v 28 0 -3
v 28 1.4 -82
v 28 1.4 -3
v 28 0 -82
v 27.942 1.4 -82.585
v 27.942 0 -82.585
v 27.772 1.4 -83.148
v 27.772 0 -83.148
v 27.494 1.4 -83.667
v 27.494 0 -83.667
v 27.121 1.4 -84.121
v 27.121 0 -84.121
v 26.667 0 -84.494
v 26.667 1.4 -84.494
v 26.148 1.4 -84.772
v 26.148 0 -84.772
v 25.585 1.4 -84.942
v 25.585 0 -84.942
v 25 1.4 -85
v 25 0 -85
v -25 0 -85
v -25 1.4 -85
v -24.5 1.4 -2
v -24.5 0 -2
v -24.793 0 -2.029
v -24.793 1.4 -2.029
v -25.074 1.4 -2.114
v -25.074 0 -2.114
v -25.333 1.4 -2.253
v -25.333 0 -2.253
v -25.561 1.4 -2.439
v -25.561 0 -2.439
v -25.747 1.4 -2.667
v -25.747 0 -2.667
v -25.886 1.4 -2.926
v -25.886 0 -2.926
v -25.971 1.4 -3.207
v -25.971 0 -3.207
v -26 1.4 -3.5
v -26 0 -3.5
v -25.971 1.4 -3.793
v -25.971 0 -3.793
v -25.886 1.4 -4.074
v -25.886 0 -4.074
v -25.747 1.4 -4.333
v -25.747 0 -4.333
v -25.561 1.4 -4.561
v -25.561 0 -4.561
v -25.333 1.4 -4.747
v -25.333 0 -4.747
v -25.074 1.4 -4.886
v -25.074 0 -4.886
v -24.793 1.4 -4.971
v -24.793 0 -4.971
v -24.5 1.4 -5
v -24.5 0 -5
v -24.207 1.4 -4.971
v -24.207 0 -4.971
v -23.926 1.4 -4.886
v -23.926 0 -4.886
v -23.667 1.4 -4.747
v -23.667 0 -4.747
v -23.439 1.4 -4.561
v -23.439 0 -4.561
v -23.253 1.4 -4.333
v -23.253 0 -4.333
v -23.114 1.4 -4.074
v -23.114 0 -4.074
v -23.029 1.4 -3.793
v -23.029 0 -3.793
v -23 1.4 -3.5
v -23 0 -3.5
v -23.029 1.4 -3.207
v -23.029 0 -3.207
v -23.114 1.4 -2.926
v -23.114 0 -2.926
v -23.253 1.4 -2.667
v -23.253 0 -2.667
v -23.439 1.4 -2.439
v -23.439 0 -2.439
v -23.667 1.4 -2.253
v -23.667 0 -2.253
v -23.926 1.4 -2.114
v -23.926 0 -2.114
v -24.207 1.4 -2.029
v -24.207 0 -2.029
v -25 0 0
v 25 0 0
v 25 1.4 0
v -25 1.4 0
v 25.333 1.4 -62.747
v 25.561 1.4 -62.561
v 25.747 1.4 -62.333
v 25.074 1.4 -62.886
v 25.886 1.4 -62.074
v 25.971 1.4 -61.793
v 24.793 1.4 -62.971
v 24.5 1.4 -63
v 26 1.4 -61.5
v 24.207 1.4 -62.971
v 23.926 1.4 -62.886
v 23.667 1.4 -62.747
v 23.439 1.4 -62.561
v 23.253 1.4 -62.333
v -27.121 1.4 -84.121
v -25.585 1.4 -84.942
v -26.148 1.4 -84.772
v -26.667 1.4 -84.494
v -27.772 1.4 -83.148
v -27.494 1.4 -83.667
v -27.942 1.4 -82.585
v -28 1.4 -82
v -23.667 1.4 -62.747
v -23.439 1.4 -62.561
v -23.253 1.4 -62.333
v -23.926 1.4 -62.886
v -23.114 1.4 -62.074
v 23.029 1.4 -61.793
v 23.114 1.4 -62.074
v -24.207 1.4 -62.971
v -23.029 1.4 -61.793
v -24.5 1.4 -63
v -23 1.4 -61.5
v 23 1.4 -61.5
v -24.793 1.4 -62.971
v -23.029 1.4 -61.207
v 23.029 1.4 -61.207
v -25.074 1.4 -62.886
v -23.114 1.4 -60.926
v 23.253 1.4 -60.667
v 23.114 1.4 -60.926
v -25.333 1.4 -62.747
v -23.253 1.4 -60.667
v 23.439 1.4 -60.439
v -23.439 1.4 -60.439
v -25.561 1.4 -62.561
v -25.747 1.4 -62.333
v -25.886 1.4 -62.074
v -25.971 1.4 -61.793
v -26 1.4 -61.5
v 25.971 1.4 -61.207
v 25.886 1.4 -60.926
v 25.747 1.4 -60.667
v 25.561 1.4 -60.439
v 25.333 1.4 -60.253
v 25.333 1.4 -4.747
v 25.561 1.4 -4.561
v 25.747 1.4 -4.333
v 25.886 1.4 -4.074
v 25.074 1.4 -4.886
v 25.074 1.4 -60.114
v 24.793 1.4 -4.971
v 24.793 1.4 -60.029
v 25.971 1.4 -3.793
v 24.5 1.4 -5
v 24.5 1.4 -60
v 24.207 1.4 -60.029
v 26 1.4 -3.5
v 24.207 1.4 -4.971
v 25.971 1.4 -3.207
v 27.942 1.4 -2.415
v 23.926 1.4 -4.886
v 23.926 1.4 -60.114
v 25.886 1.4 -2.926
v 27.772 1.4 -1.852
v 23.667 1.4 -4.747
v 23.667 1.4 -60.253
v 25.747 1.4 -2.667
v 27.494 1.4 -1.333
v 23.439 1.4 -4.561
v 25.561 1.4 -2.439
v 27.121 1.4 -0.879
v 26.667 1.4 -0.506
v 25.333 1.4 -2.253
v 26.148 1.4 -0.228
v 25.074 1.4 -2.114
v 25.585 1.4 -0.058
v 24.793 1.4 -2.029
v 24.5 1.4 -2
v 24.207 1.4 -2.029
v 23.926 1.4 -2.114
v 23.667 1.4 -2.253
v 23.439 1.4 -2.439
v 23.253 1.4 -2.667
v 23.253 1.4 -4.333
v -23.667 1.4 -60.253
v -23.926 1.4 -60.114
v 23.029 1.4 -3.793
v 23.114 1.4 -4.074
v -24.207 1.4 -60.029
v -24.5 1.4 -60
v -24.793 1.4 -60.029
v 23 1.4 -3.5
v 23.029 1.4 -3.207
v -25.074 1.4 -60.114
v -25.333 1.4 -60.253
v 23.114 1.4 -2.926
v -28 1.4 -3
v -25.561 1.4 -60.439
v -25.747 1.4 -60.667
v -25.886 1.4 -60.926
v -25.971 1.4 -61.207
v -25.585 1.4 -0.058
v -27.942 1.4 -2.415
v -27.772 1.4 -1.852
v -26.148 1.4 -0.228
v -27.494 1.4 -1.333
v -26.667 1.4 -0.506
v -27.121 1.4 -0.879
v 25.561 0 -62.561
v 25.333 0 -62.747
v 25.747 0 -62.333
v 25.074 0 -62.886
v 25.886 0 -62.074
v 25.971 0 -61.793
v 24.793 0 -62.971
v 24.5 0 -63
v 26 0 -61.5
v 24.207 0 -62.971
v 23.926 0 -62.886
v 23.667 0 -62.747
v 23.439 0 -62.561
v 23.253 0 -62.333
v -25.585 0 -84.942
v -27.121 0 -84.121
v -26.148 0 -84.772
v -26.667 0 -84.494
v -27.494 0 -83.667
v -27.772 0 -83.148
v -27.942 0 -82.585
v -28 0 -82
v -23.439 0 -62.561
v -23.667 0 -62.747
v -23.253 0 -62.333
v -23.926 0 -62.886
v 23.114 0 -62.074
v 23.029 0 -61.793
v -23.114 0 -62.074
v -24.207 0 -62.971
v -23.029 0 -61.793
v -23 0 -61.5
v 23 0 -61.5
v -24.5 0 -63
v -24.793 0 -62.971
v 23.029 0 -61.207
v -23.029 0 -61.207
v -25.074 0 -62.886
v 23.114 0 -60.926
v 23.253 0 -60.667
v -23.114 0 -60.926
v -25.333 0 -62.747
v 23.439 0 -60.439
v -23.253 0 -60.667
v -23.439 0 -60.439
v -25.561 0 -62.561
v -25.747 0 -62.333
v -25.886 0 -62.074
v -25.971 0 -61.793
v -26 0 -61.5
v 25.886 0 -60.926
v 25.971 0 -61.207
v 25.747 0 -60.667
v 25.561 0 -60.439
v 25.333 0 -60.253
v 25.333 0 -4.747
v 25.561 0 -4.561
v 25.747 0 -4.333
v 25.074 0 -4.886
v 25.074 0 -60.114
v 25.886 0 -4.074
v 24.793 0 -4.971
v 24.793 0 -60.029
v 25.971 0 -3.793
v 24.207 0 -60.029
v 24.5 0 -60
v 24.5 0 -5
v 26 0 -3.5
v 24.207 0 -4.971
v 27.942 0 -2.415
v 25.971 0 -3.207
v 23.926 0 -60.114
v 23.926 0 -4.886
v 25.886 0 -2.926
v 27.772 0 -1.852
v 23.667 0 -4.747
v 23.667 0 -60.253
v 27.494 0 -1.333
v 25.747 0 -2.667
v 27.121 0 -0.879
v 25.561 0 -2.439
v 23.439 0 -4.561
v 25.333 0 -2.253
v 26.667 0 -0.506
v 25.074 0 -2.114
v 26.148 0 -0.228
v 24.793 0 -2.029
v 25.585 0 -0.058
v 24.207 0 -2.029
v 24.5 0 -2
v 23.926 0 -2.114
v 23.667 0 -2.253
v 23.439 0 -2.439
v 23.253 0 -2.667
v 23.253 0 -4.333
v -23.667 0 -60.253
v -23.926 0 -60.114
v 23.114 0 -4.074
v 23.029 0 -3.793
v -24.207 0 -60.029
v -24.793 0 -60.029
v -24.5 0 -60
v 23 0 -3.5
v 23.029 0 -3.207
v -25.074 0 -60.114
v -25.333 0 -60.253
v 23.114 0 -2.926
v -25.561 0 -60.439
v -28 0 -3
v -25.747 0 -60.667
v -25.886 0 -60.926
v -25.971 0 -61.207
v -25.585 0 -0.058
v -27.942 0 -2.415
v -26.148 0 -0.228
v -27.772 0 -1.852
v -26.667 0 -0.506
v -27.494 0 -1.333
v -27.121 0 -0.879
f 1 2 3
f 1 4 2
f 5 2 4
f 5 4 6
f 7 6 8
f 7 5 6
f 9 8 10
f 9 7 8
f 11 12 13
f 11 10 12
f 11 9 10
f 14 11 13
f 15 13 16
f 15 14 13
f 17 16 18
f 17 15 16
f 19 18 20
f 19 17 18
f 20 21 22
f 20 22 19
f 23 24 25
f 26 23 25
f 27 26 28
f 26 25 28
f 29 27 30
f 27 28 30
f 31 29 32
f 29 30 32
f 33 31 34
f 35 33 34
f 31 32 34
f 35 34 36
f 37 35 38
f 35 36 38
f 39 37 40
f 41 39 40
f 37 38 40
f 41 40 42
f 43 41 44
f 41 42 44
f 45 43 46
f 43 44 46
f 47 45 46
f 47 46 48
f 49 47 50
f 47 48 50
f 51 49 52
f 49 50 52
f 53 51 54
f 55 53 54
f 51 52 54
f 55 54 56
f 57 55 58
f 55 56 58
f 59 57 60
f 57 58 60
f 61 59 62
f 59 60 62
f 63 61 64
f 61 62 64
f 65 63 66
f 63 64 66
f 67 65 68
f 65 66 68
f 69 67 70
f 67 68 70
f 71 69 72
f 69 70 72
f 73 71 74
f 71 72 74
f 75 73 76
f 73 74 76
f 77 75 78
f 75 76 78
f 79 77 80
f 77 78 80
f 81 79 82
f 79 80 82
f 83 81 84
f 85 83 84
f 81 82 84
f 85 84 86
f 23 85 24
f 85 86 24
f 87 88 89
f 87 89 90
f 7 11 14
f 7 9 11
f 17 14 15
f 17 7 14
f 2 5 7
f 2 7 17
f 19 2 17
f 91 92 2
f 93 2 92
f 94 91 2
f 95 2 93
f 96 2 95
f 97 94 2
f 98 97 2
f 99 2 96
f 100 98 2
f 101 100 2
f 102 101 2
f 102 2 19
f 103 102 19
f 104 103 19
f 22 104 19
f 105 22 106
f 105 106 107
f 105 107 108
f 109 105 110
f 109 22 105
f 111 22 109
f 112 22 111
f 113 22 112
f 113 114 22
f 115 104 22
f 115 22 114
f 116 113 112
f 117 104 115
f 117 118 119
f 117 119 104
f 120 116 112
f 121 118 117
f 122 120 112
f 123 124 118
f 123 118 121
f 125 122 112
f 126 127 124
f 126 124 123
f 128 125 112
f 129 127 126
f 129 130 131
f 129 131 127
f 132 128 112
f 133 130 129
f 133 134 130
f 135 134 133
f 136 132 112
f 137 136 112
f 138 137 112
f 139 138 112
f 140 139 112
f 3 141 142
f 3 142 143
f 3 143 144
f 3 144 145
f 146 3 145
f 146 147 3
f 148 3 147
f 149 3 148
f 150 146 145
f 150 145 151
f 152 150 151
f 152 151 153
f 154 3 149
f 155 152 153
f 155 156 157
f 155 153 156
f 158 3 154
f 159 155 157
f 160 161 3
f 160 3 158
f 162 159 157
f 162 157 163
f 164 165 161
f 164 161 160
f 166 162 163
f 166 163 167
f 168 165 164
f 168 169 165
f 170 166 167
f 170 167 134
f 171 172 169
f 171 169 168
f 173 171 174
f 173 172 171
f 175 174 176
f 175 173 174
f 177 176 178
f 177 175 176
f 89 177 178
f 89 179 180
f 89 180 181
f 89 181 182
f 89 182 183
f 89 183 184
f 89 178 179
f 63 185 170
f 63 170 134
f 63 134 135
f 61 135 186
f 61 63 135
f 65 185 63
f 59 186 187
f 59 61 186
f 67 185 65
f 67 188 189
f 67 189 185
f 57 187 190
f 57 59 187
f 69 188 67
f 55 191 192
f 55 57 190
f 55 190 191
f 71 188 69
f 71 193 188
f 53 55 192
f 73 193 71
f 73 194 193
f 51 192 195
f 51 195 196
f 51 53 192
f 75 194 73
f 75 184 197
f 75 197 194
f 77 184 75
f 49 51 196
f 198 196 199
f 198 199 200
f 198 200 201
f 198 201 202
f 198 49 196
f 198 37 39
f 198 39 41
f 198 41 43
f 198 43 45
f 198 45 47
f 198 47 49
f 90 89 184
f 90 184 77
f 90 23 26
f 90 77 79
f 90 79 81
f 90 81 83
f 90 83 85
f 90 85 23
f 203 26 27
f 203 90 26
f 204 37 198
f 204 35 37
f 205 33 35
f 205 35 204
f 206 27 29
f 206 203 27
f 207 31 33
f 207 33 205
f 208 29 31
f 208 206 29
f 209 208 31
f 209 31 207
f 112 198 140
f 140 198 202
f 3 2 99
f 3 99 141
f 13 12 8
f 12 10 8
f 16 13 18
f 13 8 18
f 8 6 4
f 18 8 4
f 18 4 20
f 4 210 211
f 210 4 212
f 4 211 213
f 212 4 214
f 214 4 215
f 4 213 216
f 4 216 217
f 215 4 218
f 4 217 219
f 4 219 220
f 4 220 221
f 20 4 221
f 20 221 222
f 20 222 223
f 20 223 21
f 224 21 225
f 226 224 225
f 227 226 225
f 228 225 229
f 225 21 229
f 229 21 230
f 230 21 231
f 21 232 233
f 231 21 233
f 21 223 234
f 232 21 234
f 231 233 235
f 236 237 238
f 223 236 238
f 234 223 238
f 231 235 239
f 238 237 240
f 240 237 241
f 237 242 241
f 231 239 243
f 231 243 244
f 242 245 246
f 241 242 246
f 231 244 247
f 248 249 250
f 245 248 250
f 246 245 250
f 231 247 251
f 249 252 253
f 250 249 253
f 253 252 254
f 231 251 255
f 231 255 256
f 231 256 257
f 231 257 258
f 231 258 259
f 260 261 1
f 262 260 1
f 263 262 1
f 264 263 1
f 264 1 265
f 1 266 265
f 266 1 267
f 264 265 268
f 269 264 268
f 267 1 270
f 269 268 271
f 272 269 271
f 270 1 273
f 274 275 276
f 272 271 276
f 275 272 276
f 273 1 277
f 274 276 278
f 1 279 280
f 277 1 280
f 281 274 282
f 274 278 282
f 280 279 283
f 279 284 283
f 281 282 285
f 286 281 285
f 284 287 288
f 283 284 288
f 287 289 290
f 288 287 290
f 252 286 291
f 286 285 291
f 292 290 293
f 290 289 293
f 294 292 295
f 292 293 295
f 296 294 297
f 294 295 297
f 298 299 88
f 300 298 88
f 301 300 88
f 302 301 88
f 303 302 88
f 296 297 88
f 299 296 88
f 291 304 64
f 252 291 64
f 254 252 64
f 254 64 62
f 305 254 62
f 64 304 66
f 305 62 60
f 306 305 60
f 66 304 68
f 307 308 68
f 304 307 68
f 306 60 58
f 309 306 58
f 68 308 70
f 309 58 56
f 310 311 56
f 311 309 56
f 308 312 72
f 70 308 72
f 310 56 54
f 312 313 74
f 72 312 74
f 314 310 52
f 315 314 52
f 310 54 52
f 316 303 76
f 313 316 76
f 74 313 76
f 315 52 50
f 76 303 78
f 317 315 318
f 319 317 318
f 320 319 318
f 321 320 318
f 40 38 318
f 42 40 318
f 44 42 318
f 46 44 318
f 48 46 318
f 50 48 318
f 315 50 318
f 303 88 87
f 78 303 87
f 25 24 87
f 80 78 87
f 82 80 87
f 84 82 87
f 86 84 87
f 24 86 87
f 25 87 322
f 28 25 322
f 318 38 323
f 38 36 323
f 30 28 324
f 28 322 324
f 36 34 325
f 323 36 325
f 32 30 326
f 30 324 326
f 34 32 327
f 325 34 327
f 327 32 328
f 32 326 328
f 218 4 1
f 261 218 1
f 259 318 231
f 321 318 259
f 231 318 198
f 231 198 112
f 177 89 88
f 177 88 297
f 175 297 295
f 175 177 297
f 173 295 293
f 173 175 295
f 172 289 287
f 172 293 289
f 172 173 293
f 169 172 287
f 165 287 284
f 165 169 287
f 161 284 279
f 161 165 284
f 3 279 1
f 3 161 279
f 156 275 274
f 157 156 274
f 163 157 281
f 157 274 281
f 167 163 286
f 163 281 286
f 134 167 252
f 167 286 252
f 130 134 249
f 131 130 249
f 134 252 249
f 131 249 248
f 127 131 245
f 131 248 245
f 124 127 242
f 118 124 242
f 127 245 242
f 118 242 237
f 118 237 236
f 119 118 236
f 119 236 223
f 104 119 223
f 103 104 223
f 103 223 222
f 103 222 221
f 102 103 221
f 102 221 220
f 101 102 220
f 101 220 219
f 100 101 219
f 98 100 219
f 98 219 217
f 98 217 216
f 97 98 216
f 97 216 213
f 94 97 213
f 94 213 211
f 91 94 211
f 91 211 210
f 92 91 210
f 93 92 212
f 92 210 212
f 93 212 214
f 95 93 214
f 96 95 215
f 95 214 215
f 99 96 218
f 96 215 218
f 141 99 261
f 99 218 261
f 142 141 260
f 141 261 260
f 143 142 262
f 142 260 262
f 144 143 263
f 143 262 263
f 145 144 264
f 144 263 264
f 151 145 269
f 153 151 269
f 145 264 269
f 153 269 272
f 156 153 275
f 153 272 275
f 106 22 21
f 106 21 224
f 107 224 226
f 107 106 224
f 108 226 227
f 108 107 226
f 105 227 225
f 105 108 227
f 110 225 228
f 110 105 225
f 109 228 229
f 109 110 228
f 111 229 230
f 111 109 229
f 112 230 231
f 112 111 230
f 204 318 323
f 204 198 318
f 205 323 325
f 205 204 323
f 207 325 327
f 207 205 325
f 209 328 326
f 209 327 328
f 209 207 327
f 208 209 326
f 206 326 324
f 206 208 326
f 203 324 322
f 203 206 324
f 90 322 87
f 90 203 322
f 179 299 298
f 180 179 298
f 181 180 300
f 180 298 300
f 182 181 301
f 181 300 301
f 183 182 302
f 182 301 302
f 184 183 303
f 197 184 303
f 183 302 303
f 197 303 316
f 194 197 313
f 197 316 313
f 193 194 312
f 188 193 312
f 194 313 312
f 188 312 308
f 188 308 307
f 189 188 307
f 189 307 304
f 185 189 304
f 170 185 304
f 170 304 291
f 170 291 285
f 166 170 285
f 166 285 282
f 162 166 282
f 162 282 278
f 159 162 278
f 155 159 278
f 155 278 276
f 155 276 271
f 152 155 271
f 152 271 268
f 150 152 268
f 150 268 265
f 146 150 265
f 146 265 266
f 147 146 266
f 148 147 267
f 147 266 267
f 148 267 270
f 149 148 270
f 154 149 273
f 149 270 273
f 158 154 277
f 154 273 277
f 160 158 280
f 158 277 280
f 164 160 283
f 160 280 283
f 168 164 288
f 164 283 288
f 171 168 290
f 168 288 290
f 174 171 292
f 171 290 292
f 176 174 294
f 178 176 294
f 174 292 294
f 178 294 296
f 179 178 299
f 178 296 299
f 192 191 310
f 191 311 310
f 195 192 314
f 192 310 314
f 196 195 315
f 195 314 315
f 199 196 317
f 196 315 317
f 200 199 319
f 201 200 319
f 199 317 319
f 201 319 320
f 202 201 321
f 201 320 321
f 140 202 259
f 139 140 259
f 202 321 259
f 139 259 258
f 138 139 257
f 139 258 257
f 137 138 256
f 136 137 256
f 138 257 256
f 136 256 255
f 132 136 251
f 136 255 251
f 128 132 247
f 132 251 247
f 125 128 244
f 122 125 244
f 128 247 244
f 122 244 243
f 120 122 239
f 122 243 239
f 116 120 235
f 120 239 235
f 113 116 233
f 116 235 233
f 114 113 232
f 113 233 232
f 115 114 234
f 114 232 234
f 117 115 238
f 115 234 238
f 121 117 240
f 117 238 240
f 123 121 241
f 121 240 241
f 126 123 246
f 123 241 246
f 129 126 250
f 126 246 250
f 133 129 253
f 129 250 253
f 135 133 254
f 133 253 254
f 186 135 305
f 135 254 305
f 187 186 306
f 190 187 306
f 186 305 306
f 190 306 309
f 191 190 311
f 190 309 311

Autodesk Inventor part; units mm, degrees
ref_plane "YZ Plane" through (0, 0, 0) normal (1, 0, 0) x (0, 1, 0)
ref_plane "XZ Plane" through (0, 0, 0) normal (0, 1, 0) x (-1, 0, 0)
ref_plane "XY Plane" through (0, 0, 0) normal (0, 0, 1) x (1, 0, 0)
sketch "Sketch1" plane through (0, 0, 0) normal (0, 1, 0) x (-1, 0, 0)
  line L0 (28, -85) -> (-28, -85)
  line L1 (-28, -85) -> (-28, 0)
  line L2 (-28, 0) -> (28, 0)
  line L3 (28, 0) -> (28, -85)
  point P0 (0, 0)
  point P1 (0, 0)
  dimension "d0" = 85
  dimension "d1" = 56
extrude "Extrusion1" add sketch "Sketch1" along normal blind 1.4
fillet "Fillet1" radius 3 4 edges at (-28, 0.7, 0) (28, 0.7, 0) (28, 0.7, -85) (-28, 0.7, -85)
sketch "Sketch2" plane through (0, 1.4, 0) normal (0, 1, 0) x (1, 0, 0)
  line L0 (-24.5, 61.5) -> (24.5, 61.5) construction
  line L1 (24.5, 61.5) -> (24.5, 3.5) construction
  line L2 (24.5, 3.5) -> (-24.5, 3.5) construction
  line L3 (-24.5, 3.5) -> (-24.5, 61.5) construction
  line L4 (-28, 82) -> (-28, 3) construction
  line L5 (-25, 0) -> (25, 0) construction
  point P0 (0, 0)
  dimension "d5" = 49
  dimension "d6" = 58
  dimension "d7" = 3.5
  dimension "d8" = 3.5
hole "Hole1" at (-24.5, 1.4, -61.5) at (24.5, 1.4, -61.5) at (24.5, 1.4, -3.5) at (-24.5, 1.4, -3.5) direction (0, -1, 0) diameter 3 depth 6
properties part number "raspberry pi"
